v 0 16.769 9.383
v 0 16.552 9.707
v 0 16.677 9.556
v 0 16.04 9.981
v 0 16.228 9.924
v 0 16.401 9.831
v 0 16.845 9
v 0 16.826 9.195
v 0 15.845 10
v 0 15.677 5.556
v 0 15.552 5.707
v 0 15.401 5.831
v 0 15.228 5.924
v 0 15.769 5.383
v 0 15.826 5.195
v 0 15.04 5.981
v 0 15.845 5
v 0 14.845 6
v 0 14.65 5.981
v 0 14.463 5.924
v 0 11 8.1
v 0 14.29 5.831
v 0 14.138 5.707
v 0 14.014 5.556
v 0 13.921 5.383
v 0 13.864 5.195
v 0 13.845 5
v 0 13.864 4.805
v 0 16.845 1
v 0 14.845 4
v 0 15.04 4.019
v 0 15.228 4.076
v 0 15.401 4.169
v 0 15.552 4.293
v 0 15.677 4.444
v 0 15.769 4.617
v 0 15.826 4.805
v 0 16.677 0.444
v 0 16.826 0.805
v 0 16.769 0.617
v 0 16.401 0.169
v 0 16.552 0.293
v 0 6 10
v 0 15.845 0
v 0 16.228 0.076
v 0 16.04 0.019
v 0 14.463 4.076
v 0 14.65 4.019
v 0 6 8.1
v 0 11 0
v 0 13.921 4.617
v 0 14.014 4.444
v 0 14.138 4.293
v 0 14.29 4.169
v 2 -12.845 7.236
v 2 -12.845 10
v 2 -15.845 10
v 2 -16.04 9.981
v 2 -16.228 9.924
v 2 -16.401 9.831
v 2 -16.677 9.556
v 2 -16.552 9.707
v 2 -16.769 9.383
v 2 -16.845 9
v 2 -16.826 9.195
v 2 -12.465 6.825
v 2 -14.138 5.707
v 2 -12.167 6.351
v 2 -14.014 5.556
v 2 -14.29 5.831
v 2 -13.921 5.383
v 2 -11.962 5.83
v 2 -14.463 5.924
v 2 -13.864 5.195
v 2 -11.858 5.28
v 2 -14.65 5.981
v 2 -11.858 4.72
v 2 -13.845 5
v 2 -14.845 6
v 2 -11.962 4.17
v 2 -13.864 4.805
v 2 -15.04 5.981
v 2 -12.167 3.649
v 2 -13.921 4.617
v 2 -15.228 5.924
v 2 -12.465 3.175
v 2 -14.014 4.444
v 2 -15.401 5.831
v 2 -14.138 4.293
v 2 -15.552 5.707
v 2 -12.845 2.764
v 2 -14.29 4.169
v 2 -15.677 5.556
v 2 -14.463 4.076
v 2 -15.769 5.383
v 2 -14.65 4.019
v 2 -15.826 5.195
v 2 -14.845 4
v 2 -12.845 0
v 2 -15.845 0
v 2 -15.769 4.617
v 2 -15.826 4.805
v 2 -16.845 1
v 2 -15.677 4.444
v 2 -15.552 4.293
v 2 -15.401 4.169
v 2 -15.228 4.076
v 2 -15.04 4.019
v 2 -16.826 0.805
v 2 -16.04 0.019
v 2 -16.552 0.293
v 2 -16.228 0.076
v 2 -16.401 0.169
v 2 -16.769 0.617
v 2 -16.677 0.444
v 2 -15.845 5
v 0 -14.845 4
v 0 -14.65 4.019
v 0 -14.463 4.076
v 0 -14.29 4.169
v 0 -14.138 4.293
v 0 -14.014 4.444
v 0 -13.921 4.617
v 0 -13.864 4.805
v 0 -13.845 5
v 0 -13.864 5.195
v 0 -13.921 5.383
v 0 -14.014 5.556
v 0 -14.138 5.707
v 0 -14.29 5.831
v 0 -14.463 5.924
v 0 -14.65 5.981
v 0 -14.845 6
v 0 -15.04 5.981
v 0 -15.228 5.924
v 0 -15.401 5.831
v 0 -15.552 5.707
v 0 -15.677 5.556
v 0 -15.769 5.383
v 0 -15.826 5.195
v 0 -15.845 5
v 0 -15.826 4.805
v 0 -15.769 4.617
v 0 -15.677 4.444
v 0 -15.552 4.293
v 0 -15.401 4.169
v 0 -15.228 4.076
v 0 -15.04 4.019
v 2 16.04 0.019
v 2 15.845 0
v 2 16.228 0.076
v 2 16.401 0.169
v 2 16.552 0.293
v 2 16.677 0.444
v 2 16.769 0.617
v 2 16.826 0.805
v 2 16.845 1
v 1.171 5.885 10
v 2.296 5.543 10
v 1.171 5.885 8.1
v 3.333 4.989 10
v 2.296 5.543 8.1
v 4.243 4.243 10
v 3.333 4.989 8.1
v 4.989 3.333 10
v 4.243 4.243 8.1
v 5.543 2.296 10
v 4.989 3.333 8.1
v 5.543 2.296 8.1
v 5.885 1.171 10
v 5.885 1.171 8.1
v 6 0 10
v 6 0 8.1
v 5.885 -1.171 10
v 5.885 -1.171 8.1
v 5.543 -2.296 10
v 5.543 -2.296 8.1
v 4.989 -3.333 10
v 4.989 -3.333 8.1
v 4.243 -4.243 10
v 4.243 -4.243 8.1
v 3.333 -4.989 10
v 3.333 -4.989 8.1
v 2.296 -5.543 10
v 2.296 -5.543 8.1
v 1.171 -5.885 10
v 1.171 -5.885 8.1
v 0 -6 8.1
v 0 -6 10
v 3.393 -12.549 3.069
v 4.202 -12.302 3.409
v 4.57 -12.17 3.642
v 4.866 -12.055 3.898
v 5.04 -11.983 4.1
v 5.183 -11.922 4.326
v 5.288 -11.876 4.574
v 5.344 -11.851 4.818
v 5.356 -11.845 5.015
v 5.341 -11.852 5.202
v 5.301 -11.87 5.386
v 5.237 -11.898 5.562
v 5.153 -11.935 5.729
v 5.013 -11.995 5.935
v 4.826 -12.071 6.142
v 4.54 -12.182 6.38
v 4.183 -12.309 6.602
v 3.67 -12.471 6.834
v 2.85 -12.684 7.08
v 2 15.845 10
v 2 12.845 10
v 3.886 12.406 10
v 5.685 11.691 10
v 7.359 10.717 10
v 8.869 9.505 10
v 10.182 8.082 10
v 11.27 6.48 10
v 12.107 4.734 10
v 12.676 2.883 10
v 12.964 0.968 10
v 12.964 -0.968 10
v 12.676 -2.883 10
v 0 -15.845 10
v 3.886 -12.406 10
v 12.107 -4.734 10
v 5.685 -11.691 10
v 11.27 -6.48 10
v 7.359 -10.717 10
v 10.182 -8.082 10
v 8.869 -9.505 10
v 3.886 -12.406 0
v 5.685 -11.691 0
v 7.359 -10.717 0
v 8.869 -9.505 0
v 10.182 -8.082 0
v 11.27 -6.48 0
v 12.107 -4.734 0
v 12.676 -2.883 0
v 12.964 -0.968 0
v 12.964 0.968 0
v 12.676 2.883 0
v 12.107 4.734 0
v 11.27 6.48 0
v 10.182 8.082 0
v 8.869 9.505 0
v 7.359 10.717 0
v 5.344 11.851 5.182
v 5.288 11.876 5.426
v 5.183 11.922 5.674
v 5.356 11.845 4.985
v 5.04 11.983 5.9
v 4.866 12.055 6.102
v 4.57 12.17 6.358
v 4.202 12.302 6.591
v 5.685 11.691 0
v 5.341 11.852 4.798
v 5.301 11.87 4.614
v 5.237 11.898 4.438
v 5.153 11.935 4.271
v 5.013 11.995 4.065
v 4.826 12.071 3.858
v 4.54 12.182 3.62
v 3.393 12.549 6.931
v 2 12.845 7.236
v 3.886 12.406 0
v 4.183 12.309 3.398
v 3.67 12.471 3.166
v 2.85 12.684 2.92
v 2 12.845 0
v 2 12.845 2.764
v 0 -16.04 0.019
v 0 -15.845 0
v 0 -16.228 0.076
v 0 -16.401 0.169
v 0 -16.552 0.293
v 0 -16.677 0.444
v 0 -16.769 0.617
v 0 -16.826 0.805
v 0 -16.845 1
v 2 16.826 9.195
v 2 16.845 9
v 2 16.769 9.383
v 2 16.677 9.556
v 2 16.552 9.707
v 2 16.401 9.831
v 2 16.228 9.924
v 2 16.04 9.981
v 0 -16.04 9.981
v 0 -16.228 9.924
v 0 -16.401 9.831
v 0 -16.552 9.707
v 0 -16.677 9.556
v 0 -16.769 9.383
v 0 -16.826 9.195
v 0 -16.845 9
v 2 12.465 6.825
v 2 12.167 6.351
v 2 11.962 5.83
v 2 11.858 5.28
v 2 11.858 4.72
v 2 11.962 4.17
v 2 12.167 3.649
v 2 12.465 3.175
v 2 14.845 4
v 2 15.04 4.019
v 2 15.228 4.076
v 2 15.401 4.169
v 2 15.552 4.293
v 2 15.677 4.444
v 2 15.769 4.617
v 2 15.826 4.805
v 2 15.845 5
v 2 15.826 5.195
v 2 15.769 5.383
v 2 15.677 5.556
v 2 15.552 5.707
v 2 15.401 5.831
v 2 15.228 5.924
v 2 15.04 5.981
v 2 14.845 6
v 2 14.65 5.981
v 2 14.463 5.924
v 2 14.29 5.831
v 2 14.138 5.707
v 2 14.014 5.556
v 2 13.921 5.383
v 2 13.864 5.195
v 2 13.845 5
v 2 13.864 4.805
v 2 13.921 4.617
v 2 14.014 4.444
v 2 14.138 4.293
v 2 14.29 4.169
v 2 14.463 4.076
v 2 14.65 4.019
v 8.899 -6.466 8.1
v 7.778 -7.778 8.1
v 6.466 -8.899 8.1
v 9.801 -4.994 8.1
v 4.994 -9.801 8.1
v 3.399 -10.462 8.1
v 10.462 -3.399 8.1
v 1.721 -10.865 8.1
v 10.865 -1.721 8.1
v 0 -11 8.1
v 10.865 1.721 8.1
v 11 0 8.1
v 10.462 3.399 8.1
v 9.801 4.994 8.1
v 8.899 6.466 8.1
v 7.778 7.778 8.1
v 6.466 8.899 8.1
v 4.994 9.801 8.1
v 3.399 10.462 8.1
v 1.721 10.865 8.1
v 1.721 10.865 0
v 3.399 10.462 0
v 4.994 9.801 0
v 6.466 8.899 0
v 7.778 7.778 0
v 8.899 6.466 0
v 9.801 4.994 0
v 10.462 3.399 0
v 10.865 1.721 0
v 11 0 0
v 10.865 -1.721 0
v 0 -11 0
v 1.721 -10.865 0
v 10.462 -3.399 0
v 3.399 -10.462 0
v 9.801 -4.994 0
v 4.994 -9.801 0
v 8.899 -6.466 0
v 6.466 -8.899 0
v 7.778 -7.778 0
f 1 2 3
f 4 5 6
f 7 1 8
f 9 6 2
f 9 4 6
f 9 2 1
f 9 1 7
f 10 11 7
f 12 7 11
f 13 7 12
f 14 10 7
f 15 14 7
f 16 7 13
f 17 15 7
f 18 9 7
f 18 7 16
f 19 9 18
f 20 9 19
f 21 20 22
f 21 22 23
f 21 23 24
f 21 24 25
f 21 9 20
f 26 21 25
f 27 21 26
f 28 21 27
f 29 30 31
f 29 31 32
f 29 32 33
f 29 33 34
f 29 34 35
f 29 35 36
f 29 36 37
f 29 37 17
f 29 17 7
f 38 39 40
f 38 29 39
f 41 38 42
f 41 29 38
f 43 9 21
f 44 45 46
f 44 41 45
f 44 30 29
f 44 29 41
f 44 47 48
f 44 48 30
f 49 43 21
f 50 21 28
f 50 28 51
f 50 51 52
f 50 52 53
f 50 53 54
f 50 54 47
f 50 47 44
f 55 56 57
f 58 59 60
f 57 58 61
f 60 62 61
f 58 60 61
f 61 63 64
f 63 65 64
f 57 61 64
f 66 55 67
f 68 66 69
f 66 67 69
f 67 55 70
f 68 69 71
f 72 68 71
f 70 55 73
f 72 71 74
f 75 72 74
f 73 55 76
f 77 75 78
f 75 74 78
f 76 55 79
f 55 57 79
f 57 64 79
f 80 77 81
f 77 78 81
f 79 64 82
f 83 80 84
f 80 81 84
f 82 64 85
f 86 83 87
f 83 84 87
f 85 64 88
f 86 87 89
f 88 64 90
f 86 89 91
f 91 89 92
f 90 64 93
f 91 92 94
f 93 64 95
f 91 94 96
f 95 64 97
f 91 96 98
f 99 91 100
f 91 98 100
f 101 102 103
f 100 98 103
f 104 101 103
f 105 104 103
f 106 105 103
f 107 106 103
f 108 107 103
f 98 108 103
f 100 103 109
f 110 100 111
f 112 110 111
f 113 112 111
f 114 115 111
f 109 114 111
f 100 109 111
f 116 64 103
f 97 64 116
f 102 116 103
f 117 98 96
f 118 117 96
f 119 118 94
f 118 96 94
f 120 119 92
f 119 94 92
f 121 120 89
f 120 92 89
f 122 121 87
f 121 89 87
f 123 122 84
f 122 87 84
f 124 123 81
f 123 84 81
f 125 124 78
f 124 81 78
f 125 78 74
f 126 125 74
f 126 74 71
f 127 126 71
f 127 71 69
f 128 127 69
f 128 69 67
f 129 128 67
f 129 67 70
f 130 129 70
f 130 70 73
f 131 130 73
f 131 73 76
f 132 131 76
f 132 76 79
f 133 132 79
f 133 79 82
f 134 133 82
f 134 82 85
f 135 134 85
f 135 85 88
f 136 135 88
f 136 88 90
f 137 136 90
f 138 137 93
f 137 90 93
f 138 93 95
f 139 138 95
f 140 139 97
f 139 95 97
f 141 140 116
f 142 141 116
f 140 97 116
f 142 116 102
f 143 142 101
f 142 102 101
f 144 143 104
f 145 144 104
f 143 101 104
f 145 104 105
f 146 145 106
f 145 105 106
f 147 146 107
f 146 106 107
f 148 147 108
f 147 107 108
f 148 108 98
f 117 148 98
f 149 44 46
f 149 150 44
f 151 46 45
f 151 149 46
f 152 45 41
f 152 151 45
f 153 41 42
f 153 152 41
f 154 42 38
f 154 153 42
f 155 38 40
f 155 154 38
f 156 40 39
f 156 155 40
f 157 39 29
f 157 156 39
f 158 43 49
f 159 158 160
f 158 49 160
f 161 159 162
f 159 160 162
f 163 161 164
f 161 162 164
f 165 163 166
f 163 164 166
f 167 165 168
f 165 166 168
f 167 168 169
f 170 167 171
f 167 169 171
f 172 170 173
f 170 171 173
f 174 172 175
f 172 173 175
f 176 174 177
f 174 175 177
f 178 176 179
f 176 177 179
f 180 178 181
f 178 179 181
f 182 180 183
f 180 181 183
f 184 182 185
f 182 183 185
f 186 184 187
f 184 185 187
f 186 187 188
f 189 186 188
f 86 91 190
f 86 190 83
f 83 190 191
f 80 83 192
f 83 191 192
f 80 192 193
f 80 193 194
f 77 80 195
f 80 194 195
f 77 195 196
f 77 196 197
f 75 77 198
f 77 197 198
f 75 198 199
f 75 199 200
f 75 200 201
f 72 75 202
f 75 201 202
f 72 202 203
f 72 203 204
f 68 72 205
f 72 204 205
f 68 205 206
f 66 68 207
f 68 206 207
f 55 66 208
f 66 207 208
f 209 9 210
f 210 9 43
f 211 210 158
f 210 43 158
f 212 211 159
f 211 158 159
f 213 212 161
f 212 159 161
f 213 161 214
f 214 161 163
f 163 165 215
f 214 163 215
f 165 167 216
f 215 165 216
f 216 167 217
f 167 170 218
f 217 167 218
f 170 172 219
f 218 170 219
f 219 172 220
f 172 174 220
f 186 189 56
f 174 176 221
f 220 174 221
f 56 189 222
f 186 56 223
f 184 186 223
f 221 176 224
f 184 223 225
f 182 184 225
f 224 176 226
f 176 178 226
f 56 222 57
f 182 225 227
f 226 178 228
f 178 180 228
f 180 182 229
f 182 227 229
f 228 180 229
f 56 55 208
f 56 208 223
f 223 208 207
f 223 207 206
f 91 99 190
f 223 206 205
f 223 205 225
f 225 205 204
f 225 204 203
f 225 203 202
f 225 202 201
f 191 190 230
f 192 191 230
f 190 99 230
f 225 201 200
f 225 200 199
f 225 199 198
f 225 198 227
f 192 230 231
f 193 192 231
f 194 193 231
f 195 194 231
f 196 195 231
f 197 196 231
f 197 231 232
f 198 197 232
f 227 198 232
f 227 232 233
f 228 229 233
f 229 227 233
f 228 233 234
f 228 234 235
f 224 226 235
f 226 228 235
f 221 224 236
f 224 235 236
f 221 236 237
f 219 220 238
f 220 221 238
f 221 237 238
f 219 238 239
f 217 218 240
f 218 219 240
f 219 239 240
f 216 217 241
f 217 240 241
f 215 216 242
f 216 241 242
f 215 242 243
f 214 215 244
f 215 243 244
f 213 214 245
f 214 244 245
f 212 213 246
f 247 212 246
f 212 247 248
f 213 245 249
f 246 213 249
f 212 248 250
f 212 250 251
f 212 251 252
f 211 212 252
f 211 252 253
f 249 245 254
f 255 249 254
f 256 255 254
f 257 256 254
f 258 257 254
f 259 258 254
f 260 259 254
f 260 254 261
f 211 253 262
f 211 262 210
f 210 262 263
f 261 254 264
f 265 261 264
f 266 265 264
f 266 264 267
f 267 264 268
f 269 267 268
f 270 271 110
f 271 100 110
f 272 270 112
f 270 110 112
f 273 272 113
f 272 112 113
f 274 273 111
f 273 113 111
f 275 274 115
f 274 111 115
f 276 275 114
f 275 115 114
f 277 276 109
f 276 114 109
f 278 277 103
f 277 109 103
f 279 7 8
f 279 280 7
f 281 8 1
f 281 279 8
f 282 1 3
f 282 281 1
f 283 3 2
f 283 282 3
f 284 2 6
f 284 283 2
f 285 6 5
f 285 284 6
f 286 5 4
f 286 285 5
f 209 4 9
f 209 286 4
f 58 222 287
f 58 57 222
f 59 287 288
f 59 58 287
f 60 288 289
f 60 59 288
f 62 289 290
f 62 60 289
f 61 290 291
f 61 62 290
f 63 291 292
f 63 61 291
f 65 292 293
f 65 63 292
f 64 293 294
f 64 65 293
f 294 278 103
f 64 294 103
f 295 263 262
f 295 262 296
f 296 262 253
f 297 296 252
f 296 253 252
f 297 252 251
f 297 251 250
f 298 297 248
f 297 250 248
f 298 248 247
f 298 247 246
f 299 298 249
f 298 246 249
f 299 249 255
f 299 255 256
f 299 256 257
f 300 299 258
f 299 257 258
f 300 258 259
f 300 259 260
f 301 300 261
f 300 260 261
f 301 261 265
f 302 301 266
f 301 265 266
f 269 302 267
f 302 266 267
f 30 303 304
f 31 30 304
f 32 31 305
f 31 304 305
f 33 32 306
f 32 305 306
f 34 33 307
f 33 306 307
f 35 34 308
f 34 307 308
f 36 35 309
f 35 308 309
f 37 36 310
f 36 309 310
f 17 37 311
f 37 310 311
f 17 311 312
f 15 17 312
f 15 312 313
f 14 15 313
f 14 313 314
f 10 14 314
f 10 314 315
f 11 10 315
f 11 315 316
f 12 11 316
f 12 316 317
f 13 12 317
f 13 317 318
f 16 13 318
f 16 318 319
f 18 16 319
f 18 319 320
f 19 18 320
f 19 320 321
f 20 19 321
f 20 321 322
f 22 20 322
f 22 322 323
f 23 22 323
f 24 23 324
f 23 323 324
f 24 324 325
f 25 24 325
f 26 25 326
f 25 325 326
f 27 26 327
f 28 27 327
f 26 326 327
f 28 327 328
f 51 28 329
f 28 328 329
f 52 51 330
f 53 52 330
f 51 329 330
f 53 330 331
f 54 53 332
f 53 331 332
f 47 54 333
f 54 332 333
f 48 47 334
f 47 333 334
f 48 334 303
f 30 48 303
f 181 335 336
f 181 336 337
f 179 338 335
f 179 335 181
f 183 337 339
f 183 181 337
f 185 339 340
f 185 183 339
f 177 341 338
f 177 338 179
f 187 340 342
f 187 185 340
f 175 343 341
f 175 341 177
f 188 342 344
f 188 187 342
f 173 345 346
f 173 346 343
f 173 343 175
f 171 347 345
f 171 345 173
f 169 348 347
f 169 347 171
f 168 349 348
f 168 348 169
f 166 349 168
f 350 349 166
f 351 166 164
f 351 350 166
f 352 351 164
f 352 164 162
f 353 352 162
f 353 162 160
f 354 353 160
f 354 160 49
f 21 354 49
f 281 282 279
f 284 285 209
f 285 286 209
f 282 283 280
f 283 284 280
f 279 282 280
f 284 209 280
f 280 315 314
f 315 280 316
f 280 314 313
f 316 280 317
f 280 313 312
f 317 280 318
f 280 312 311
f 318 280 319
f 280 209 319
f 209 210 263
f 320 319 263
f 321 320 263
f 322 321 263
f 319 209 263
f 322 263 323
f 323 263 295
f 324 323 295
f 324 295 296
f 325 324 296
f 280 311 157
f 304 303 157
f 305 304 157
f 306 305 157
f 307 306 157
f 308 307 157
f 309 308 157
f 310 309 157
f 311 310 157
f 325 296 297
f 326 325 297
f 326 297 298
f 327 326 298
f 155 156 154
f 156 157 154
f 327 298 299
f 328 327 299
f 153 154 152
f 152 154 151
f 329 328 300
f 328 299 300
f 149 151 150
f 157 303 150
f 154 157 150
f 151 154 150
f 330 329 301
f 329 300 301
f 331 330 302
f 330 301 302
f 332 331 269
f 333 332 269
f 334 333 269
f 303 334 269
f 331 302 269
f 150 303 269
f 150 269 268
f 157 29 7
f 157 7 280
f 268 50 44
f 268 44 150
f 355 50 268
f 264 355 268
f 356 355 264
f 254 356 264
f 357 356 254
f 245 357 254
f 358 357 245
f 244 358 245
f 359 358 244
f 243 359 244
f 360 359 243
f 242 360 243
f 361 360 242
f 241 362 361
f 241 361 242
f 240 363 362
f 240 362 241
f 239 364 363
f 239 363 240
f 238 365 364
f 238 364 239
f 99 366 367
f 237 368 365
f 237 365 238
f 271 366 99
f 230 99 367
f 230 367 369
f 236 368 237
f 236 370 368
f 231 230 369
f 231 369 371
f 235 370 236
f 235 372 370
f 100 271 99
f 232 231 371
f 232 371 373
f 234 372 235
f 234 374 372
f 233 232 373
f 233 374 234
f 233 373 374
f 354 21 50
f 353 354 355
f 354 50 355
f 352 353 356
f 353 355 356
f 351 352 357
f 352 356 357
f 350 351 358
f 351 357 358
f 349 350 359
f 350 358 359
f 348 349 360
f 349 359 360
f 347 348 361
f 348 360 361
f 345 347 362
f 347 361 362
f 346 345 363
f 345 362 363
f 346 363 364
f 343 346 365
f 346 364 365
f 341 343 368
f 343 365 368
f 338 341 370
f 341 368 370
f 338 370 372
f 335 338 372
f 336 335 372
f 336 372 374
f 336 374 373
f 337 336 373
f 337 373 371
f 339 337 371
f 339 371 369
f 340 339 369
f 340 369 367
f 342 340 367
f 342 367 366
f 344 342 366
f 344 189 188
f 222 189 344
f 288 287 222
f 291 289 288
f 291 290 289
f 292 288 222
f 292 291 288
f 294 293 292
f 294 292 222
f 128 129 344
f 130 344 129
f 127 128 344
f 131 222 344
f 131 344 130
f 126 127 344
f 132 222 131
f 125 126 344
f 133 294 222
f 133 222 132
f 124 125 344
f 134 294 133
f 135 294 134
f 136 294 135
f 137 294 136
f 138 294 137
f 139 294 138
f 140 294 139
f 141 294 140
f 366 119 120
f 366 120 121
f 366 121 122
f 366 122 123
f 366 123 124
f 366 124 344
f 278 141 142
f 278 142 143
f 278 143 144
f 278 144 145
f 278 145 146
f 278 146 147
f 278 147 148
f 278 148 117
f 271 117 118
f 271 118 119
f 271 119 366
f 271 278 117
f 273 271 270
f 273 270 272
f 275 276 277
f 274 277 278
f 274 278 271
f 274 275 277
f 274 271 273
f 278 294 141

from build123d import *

# Parameters (mm, degrees)
SKETCH1_R           = 13
BOSS_EXTRUDE1_DEPTH = 10
CUT_EXTRUDE1_DEPTH  = 10
SKETCH4_R           = 11
CUT_EXTRUDE2_DEPTH  = 8.1
BOSS_EXTRUDE2_START = 11.845233
SKETCH5_W           = 2
SKETCH5_H           = 10
BOSS_EXTRUDE2_DEPTH = 5
BOSS_EXTRUDE3_START = -16.845233
SKETCH5_2_W         = 2
SKETCH5_2_H         = 10
BOSS_EXTRUDE3_DEPTH = 5
SKETCH6_R           = 1
CUT_EXTRUDE3_DEPTH  = 5
SKETCH7_R           = 1
CUT_EXTRUDE4_DEPTH  = 5
SKETCH8_R           = 6
CUT_EXTRUDE5_DEPTH  = 10
CUT_EXTRUDE6_START  = 10
SKETCH9_R           = 3
CUT_EXTRUDE6_DEPTH  = 8
CUT_EXTRUDE7_START  = 10
SKETCH10_R          = 3
CUT_EXTRUDE7_DEPTH  = 8
FILLET1_R           = 1
FILLET2_R           = 1
FILLET3_R           = 1
FILLET4_R           = 1


with BuildPart() as part:
    # Sketch1 → Boss-Extrude1 (new body)
    with BuildSketch(Plane.XY):
        Circle(SKETCH1_R)
    extrude(amount=BOSS_EXTRUDE1_DEPTH)

    # Sketch2 → Cut-Extrude1 (cut)
    with BuildSketch(Plane.XY.offset(10)):
        Polygon((0, 0), (0, -13.849459762), (-21.443242854, -13.849459762), (-21.443242854, 14.185204241), (0, 14.185204241), align=None)
    extrude(amount=-CUT_EXTRUDE1_DEPTH, mode=Mode.SUBTRACT)

    # Sketch4 → Cut-Extrude2 (cut)
    with BuildSketch(Plane(origin=(0, 0, 0), x_dir=(-1, 0, 0), z_dir=(0, 0, -1))):
        Circle(SKETCH4_R)
    extrude(amount=-CUT_EXTRUDE2_DEPTH, mode=Mode.SUBTRACT)

    # Sketch5 → Boss-Extrude2 (add)
    with BuildSketch(Plane(origin=(0, 0, 0), x_dir=(1, 0, 0), z_dir=(0, 1, 0)).offset(BOSS_EXTRUDE2_START)):
        with Locations((1, -5)):
            Rectangle(SKETCH5_W, SKETCH5_H)
    extrude(amount=BOSS_EXTRUDE2_DEPTH)

    # Sketch5<2> → Boss-Extrude3 (add)
    with BuildSketch(Plane(origin=(0, 0, 0), x_dir=(1, 0, 0), z_dir=(0, 1, 0)).offset(BOSS_EXTRUDE3_START)):
        with Locations((1, -5)):
            Rectangle(SKETCH5_2_W, SKETCH5_2_H)
    extrude(amount=BOSS_EXTRUDE3_DEPTH)

    # Sketch6 → Cut-Extrude3 (cut)
    with BuildSketch(Plane(origin=(2, 0, 0), x_dir=(0, 0, -1), z_dir=(1, 0, 0))):
        with Locations((-5, 14.845233)):
            Circle(SKETCH6_R)
    extrude(amount=-CUT_EXTRUDE3_DEPTH, mode=Mode.SUBTRACT)

    # Sketch7 → Cut-Extrude4 (cut)
    with BuildSketch(Plane(origin=(2, 0, 0), x_dir=(0, 0, -1), z_dir=(1, 0, 0))):
        with Locations((-5, -14.845233)):
            Circle(SKETCH7_R)
    extrude(amount=-CUT_EXTRUDE4_DEPTH, mode=Mode.SUBTRACT)

    # Sketch8 → Cut-Extrude5 (cut)
    with BuildSketch(Plane(origin=(0, 0, 8.1), x_dir=(-1, 0, 0), z_dir=(0, 0, -1))):
        Circle(SKETCH8_R)
    extrude(amount=-CUT_EXTRUDE5_DEPTH, mode=Mode.SUBTRACT)

    # Sketch9 → Cut-Extrude6 (cut)
    with BuildSketch(Plane(origin=(0, 0, 0), x_dir=(0, 0, -1), z_dir=(1, 0, 0)).offset(CUT_EXTRUDE6_START)):
        with Locations((-5, 14.845233)):
            Circle(SKETCH9_R)
    extrude(amount=-CUT_EXTRUDE6_DEPTH, mode=Mode.SUBTRACT)

    # Sketch10 → Cut-Extrude7 (cut)
    with BuildSketch(Plane(origin=(0, 0, 0), x_dir=(0, 0, -1), z_dir=(1, 0, 0)).offset(CUT_EXTRUDE7_START)):
        with Locations((-5, -14.845233)):
            Circle(SKETCH10_R)
    extrude(amount=-CUT_EXTRUDE7_DEPTH, mode=Mode.SUBTRACT)

    # Fillet1
    fillet1_edges = [part.edges().sort_by_distance(p)[0] for p in [
        (1, -16.845233, 0),
    ]]
    fillet(fillet1_edges, radius=FILLET1_R)

    # Fillet2
    fillet2_edges = [part.edges().sort_by_distance(p)[0] for p in [
        (1, 16.845233, 0),
    ]]
    fillet(fillet2_edges, radius=FILLET2_R)

    # Fillet3
    fillet3_edges = [part.edges().sort_by_distance(p)[0] for p in [
        (1, 16.845233, 10),
    ]]
    fillet(fillet3_edges, radius=FILLET3_R)

    # Fillet4
    fillet4_edges = [part.edges().sort_by_distance(p)[0] for p in [
        (1, -16.845233, 10),
    ]]
    fillet(fillet4_edges, radius=FILLET4_R)


solid = part.part
